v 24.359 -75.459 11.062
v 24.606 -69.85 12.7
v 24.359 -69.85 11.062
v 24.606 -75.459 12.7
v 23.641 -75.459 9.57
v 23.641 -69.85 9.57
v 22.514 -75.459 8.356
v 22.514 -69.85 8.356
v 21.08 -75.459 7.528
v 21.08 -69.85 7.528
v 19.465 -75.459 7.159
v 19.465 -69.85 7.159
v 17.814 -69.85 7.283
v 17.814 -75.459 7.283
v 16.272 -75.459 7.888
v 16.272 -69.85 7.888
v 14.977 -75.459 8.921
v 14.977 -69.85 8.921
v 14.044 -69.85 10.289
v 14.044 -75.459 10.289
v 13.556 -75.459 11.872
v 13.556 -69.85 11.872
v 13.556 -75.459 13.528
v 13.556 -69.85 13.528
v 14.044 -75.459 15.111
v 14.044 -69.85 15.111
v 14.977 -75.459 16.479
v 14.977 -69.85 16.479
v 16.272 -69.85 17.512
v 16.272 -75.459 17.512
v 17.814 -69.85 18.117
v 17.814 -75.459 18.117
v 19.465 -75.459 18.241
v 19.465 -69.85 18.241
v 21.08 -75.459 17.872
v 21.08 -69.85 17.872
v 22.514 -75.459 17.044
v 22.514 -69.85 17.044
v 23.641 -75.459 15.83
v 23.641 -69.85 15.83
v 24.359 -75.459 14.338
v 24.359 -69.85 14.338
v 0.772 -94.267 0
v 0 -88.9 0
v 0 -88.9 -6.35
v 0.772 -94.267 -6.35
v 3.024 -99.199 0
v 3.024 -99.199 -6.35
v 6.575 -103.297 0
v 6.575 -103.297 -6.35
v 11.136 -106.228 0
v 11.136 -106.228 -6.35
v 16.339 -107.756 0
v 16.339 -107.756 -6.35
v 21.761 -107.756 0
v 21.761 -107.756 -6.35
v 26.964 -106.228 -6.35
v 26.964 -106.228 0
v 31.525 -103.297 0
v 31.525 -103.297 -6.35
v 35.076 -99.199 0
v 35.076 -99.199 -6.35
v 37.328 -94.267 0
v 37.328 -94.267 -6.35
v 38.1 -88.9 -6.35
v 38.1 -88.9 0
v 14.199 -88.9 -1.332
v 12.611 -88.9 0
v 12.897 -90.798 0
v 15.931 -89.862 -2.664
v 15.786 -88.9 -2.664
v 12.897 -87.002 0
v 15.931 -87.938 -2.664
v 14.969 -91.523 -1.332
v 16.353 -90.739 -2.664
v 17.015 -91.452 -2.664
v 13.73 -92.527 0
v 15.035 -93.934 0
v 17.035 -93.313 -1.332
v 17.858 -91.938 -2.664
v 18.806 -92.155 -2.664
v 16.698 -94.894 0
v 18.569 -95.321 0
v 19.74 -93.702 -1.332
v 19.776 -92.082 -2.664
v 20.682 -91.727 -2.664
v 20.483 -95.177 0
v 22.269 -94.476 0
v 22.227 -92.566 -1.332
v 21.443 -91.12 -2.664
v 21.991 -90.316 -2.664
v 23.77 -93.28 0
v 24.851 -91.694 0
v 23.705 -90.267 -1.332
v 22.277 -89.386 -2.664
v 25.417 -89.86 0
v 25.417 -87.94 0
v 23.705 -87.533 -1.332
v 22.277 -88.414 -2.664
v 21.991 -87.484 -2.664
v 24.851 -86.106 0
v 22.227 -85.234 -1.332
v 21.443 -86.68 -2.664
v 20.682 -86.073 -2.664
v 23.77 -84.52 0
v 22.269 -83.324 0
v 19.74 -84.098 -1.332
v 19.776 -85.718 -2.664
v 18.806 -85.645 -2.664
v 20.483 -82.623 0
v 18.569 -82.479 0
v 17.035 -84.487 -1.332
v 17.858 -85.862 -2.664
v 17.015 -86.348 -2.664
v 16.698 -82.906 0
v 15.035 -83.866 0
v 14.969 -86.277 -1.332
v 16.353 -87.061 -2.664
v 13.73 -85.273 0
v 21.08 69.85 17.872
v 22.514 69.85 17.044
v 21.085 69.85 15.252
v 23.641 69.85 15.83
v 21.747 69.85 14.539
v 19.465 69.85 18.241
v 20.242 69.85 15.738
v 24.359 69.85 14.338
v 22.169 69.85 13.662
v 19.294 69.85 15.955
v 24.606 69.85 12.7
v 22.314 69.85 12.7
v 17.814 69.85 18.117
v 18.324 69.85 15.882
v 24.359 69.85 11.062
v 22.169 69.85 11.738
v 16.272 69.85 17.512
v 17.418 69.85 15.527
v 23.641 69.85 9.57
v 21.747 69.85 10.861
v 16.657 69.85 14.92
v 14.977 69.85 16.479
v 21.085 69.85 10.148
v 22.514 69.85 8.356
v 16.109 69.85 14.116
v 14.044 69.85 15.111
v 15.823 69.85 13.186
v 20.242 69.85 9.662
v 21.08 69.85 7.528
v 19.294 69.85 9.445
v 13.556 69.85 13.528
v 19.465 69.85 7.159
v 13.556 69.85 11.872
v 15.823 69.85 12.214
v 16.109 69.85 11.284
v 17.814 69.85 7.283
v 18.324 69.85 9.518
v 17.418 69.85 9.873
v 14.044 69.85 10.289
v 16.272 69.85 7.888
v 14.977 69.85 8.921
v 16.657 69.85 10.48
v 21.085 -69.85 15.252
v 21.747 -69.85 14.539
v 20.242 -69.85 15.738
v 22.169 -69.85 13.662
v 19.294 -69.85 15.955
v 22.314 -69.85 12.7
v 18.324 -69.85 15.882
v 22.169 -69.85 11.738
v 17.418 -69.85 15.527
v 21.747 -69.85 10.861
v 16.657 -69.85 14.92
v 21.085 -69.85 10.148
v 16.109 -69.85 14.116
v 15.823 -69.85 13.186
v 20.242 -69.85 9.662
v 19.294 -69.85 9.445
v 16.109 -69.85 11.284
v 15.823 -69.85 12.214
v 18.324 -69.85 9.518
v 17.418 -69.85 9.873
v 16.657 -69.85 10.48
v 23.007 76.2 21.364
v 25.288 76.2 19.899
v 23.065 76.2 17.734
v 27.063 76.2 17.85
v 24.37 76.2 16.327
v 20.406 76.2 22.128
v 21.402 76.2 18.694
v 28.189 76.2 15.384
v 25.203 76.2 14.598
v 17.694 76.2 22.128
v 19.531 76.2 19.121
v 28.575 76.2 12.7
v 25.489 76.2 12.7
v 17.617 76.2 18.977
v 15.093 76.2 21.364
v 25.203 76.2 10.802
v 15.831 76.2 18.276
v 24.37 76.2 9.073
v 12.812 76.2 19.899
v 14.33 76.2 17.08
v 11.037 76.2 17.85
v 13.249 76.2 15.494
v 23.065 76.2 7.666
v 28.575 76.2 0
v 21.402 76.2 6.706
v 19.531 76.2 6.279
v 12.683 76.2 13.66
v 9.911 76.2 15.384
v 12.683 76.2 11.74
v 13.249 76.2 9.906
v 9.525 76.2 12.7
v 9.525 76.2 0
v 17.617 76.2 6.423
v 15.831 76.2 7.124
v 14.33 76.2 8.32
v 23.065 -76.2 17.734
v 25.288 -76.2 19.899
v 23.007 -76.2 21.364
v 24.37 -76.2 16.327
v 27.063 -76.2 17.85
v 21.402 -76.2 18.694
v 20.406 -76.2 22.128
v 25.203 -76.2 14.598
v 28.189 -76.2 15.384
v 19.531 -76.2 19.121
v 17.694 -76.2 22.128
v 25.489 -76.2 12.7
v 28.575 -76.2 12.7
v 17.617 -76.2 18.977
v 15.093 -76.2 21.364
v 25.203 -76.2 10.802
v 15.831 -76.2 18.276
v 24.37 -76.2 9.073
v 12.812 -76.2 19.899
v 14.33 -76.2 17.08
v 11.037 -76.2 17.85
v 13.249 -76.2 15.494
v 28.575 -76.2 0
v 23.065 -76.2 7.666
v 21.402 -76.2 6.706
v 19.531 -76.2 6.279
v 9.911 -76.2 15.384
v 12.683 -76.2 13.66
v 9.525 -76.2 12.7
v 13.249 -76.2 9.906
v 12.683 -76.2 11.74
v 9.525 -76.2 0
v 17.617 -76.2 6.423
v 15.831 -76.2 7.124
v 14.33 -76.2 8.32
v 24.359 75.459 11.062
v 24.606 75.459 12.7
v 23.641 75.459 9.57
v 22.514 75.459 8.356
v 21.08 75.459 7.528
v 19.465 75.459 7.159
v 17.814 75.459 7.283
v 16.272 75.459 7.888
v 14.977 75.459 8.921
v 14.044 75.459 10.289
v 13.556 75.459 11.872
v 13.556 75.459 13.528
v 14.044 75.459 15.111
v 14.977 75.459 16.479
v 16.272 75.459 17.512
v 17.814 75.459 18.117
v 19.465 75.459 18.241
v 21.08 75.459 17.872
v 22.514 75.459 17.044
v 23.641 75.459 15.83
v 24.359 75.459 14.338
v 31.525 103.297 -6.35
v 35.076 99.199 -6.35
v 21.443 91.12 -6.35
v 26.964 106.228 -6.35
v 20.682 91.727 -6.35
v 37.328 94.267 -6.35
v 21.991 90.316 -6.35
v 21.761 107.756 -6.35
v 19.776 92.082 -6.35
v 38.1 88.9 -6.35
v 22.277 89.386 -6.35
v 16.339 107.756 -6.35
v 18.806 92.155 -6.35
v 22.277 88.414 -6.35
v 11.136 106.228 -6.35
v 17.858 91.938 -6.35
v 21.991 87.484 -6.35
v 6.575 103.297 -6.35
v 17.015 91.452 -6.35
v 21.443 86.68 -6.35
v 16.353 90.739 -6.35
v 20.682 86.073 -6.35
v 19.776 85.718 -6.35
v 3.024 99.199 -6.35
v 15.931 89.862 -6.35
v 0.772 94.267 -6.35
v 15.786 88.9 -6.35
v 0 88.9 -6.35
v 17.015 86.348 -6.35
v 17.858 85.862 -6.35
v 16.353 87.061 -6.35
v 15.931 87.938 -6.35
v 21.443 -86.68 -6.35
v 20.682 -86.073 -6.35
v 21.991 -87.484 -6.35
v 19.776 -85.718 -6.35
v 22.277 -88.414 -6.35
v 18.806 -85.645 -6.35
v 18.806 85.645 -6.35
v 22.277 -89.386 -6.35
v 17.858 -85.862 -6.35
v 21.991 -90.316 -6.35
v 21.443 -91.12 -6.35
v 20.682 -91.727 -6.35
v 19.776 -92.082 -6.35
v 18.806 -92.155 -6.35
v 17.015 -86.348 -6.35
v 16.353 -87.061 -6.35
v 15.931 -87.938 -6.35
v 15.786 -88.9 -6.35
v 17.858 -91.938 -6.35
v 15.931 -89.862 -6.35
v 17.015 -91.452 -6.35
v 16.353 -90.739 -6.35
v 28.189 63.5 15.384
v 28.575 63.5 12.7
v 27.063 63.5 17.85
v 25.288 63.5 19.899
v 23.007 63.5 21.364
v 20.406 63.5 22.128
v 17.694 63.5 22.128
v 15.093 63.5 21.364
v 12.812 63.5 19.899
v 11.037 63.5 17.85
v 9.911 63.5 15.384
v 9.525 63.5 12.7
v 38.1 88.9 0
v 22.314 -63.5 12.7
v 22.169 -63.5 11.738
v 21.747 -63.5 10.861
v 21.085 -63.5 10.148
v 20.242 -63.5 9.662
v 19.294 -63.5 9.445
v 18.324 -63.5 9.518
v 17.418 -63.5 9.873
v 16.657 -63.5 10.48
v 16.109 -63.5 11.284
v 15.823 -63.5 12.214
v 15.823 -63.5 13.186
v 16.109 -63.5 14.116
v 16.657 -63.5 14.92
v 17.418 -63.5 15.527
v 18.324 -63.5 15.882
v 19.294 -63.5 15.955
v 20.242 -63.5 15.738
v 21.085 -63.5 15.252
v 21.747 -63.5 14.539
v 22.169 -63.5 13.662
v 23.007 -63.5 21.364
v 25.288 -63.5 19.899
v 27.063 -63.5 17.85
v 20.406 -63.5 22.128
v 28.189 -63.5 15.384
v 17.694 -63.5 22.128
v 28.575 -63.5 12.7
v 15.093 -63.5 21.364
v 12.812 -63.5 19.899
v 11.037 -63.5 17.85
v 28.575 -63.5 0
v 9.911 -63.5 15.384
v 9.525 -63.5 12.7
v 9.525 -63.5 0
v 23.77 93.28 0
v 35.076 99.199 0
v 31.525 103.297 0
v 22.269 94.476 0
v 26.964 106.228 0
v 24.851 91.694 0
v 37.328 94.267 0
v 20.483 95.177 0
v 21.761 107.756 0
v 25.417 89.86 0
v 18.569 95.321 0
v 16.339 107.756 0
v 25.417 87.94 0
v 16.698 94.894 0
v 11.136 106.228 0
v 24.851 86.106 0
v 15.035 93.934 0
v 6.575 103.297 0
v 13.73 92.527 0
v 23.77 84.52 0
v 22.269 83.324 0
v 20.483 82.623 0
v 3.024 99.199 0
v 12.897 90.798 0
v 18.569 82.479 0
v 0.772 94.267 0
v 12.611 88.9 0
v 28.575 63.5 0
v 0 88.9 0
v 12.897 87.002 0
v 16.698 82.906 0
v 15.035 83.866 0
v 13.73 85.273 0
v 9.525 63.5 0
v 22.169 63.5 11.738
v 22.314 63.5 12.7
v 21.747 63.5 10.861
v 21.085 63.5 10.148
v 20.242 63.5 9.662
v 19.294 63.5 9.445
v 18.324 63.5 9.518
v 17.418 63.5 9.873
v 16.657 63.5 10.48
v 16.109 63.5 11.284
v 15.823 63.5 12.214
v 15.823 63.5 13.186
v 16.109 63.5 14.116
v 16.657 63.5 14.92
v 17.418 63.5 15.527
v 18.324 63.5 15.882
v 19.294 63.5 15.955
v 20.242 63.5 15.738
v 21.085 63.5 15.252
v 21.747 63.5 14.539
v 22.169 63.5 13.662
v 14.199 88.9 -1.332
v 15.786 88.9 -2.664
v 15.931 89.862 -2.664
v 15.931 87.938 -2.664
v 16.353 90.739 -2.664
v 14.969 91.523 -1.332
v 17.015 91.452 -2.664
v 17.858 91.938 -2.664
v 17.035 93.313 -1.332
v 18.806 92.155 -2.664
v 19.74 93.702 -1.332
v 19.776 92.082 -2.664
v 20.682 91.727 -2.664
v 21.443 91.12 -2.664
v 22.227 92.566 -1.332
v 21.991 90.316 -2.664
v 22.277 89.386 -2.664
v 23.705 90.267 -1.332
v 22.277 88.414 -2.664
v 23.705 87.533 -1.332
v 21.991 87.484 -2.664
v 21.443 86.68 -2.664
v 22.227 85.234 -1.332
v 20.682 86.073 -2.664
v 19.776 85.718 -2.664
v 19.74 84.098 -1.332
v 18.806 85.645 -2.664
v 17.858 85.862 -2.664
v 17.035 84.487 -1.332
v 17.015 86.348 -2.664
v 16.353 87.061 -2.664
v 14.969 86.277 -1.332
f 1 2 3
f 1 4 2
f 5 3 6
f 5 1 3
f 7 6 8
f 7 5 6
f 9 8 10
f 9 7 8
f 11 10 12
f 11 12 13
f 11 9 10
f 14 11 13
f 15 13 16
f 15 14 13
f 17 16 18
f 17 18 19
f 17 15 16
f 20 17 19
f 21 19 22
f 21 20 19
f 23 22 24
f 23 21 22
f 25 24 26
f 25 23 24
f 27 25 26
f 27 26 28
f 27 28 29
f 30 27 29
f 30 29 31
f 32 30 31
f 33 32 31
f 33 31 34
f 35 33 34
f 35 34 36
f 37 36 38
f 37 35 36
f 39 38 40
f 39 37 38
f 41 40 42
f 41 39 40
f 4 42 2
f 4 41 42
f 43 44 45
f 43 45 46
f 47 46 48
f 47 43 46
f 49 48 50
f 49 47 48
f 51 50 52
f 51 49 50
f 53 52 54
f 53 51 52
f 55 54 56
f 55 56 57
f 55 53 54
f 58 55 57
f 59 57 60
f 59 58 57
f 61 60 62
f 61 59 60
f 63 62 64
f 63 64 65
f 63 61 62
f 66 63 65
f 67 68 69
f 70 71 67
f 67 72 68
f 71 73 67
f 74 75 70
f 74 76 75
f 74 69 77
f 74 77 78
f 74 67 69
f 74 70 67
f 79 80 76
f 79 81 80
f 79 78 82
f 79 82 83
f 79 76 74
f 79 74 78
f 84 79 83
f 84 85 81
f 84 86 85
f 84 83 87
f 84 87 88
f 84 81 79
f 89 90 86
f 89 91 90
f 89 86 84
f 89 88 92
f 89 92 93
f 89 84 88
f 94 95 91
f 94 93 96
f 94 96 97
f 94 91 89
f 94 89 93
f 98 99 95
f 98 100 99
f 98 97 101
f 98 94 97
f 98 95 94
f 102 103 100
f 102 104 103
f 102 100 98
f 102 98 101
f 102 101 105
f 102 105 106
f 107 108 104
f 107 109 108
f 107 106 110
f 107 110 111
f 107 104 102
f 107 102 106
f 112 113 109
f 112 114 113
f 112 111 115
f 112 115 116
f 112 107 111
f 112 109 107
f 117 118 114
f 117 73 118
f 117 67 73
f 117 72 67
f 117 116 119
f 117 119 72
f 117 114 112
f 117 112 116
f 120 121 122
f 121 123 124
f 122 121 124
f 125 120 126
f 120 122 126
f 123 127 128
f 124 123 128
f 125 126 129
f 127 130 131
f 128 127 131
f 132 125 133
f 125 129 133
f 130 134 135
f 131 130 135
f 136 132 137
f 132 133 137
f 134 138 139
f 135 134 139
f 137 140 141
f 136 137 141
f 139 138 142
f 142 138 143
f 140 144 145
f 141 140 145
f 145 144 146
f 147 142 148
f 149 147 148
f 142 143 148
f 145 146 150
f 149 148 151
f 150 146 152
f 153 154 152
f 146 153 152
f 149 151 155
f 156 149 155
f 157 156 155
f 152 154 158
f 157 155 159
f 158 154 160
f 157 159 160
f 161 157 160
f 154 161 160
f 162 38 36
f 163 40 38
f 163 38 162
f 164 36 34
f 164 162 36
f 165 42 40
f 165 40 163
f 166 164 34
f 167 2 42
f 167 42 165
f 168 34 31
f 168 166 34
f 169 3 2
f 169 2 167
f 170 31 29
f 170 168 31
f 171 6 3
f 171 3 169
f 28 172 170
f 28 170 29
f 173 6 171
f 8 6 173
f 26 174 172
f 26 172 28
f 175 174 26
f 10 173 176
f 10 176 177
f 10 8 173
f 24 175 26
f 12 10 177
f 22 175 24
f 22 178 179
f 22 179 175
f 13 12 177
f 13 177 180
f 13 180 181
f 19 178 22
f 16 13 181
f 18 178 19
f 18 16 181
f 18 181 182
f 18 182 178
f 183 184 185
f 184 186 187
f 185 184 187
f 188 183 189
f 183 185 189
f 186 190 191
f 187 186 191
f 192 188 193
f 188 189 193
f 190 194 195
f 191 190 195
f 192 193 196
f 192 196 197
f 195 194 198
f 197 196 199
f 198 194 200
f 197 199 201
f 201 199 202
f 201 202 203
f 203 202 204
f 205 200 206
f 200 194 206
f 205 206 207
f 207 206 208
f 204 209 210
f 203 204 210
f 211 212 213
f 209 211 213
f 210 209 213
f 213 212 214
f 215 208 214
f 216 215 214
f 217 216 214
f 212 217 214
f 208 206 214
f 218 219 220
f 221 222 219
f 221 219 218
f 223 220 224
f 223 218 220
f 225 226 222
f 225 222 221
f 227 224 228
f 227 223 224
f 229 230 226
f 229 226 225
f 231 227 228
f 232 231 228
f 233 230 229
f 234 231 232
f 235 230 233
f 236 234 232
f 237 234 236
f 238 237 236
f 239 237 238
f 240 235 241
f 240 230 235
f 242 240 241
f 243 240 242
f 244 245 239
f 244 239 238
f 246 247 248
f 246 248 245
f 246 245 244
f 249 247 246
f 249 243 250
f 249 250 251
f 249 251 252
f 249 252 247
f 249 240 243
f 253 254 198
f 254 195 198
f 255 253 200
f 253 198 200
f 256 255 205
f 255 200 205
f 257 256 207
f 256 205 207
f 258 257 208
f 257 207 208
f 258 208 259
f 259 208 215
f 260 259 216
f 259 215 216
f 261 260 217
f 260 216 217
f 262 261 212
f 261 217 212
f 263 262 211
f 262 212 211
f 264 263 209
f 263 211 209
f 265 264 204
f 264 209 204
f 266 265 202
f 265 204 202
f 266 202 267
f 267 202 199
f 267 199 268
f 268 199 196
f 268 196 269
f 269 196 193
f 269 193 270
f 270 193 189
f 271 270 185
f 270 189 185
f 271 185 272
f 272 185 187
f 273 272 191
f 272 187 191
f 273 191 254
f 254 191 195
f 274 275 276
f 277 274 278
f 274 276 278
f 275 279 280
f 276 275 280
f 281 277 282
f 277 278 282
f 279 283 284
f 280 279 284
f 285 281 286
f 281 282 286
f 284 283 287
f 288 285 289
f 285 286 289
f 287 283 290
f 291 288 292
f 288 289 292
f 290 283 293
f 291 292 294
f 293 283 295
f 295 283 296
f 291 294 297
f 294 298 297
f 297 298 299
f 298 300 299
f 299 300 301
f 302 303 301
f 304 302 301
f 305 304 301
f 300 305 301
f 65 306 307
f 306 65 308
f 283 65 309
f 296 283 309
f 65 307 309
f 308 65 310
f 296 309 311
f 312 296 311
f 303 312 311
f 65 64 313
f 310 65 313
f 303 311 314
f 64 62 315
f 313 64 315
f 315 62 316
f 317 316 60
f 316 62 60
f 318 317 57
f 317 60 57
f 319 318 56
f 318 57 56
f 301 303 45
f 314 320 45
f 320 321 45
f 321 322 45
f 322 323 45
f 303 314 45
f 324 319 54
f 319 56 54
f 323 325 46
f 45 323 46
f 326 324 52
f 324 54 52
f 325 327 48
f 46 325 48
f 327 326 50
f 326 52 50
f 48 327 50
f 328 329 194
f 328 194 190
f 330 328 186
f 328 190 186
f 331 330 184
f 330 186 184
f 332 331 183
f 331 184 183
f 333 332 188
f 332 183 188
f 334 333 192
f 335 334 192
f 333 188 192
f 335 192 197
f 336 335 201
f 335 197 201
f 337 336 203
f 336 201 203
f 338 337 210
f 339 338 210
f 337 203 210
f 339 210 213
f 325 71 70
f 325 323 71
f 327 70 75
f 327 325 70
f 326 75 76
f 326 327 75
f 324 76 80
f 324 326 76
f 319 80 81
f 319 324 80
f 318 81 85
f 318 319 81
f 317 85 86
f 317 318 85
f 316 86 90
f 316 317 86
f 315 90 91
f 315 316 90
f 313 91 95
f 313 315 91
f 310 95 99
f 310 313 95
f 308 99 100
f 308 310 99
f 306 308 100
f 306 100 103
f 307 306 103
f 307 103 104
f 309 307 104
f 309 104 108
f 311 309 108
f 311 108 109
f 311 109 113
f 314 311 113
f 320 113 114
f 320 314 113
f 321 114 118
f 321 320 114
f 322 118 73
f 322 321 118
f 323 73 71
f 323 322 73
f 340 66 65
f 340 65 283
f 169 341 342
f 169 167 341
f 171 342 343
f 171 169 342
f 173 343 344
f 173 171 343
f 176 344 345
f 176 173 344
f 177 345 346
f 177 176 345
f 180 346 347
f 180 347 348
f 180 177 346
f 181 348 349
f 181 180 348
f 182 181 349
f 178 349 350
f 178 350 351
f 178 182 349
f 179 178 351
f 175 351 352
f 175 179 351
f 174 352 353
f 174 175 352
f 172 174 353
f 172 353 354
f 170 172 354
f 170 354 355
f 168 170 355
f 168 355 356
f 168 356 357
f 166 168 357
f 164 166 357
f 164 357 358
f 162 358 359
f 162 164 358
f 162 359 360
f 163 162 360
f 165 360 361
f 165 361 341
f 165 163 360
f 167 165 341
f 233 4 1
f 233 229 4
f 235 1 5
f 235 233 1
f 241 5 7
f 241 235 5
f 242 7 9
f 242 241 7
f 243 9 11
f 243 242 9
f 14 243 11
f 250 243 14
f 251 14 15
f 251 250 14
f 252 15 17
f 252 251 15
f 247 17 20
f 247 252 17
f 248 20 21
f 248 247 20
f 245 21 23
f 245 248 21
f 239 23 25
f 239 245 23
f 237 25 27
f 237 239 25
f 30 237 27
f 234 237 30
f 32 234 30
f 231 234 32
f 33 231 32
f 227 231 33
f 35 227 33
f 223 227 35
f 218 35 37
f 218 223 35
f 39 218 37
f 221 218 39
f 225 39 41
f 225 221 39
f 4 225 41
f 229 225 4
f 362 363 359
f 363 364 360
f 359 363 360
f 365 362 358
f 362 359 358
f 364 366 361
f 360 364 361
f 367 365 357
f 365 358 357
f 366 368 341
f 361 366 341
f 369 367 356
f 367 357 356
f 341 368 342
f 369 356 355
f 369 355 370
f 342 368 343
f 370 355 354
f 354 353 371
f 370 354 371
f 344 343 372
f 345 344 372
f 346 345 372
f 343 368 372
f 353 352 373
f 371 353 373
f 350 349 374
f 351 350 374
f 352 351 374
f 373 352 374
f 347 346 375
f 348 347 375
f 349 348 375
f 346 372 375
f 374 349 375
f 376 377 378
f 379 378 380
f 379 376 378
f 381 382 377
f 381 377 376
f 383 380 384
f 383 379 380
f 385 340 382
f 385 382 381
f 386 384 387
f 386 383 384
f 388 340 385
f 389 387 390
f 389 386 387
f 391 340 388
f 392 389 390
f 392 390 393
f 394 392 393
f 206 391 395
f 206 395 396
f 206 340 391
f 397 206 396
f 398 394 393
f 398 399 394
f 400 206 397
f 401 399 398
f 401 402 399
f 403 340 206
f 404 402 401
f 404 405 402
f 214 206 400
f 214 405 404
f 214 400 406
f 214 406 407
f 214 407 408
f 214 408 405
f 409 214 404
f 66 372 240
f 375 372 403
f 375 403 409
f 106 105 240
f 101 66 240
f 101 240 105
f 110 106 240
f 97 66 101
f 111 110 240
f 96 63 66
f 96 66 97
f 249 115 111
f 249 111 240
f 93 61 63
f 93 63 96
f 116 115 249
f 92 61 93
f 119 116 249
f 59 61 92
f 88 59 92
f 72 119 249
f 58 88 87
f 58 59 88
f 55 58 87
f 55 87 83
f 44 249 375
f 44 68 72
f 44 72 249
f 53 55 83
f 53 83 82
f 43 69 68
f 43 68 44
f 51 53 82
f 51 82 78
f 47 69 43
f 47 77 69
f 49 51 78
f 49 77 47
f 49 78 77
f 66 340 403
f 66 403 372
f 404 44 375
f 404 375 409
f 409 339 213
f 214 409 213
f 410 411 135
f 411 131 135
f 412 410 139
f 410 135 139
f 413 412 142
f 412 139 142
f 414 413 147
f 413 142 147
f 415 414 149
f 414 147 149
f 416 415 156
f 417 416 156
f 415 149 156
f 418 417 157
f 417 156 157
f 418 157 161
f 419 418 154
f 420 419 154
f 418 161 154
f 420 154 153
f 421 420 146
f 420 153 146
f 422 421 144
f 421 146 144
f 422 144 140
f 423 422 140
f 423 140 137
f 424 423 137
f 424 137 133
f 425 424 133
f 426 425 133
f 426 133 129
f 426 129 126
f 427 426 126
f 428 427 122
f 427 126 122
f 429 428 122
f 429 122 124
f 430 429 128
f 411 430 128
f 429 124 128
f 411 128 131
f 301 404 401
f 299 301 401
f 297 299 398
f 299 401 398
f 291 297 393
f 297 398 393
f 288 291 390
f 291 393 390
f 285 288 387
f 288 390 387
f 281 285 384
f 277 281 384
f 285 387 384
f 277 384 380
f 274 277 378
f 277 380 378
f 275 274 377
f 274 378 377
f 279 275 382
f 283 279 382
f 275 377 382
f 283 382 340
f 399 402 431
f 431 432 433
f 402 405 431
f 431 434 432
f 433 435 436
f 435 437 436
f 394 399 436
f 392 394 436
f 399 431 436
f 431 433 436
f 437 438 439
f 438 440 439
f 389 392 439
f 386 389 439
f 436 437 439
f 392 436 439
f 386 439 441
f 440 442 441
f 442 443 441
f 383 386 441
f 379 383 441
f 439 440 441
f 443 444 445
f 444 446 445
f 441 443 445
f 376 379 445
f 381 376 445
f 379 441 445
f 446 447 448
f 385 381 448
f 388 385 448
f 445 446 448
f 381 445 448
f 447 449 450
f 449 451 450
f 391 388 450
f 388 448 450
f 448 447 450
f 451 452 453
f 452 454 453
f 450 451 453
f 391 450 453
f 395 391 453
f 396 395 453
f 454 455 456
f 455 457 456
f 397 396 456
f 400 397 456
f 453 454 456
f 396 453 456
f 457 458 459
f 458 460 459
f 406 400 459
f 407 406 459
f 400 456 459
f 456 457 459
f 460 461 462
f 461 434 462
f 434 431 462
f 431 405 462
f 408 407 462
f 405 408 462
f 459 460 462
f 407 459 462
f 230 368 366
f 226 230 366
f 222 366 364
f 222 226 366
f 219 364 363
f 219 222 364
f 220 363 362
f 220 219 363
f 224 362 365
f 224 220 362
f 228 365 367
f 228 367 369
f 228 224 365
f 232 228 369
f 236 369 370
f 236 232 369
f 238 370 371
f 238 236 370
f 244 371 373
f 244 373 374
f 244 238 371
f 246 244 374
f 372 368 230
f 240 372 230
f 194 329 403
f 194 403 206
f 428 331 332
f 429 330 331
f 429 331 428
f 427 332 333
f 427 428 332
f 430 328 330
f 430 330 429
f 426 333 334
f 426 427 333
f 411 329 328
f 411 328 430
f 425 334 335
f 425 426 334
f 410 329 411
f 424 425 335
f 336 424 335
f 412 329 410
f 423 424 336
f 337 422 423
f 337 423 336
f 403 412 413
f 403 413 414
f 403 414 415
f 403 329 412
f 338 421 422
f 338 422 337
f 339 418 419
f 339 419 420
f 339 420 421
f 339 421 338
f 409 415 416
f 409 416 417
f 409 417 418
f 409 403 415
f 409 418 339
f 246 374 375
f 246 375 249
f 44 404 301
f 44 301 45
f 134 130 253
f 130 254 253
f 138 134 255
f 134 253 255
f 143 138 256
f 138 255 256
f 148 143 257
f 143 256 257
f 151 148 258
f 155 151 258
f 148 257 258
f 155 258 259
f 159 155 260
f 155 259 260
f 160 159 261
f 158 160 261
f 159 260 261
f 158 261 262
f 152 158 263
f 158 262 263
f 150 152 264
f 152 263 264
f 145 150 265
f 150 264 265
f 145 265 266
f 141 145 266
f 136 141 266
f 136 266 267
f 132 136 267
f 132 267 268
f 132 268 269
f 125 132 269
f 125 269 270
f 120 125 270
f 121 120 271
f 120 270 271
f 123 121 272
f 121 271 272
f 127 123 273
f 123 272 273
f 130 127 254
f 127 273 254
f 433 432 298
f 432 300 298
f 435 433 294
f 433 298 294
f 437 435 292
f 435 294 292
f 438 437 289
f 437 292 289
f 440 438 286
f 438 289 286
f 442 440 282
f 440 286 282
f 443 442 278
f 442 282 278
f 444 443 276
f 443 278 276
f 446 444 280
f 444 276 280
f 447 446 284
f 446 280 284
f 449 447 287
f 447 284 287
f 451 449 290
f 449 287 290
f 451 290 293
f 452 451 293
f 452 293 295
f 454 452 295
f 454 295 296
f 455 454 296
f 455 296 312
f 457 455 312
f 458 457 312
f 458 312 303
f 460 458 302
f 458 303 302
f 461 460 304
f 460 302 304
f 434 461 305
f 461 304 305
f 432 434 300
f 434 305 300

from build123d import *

# Parameters (mm, degrees)
BOSS_EXTRUDE1_DEPTH                                 = 6.35
CSK_FOR_1_4_FLAT_HEAD_MACHINE_SCREW_100_D           = 6.5278
CSK_FOR_1_4_FLAT_HEAD_MACHINE_SCREW_100_CSINK_D     = 12.8778
CSK_FOR_1_4_FLAT_HEAD_MACHINE_SCREW_100_CSINK_ANGLE = 100
SKETCH5_W                                           = 19.05
SKETCH5_H                                           = 12.7
BOSS_EXTRUDE2_DEPTH                                 = 12.7
BOSS_EXTRUDE3_DEPTH                                 = 12.7


# Read off the part's stored shape, not the designer's step: CBORE for 1/4 Socket Head Cap Screw1
with BuildPart() as part:
    # Sketch1 → Boss-Extrude1 (new body)
    with BuildSketch(Plane.XY):
        with BuildLine():
            Line((0, 0), (0, 88.9))
            ThreePointArc((0, 88.9), (19.05, 107.95), (38.1, 88.9))
            Line((38.1, 88.9), (38.1, 0))
            Line((38.1, 0), (0, 0))
        make_face()
    extrude(amount=-BOSS_EXTRUDE1_DEPTH)

    # CSK for 1/4 Flat Head Machine Screw (100)1 (through all)
    with Locations(Plane.XY):
        with Locations((19.05, 88.9)):
            CounterSinkHole(CSK_FOR_1_4_FLAT_HEAD_MACHINE_SCREW_100_D / 2, CSK_FOR_1_4_FLAT_HEAD_MACHINE_SCREW_100_CSINK_D / 2, counter_sink_angle=CSK_FOR_1_4_FLAT_HEAD_MACHINE_SCREW_100_CSINK_ANGLE)

    # Sketch5 → Boss-Extrude2 (add)
    with BuildSketch(Plane.XY):
        with Locations((19.05, 69.85)):
            Rectangle(SKETCH5_W, SKETCH5_H)
    extrude(amount=BOSS_EXTRUDE2_DEPTH)

    # Sketch6 → Boss-Extrude3 (add)
    with BuildSketch(Plane(origin=(0, 76.2, 0), x_dir=(1, 0, 0), z_dir=(0, 1, 0))):
        with BuildLine():
            Line((9.525, -12.7), (28.575, -12.7))
            ThreePointArc((28.575, -12.7), (19.05, -22.225), (9.525, -12.7))
        make_face()
    extrude(amount=-BOSS_EXTRUDE3_DEPTH)

    # CBORE for 1/4 Socket Head Cap Screw1 out → CBORE for 1/4 Socket Head Cap Screw1 (revolve, cut)
    with BuildSketch(Plane(origin=(19.05, 0, 12.7), x_dir=(1, 0, 0), z_dir=(0, 0, 1))):
        Polygon((0, 63.5), (3.2639, 63.5), (3.2639, 69.85), (5.55625, 69.85), (5.55625, 75.459368711), (6.4389, 76.2), (0, 76.2), align=None)
    revolve(axis=Axis((19.05, 0, 12.7), (0, 1, 0)), mode=Mode.SUBTRACT)

    # Mirror1: part across plane


with BuildPart() as part_1:
    add(part.part)
    add(part.part.mirror(Plane(origin=(38.1, 0, -6.35), x_dir=(0, 0, 1), z_dir=(0, -1, 0))))


solid = part_1.part
